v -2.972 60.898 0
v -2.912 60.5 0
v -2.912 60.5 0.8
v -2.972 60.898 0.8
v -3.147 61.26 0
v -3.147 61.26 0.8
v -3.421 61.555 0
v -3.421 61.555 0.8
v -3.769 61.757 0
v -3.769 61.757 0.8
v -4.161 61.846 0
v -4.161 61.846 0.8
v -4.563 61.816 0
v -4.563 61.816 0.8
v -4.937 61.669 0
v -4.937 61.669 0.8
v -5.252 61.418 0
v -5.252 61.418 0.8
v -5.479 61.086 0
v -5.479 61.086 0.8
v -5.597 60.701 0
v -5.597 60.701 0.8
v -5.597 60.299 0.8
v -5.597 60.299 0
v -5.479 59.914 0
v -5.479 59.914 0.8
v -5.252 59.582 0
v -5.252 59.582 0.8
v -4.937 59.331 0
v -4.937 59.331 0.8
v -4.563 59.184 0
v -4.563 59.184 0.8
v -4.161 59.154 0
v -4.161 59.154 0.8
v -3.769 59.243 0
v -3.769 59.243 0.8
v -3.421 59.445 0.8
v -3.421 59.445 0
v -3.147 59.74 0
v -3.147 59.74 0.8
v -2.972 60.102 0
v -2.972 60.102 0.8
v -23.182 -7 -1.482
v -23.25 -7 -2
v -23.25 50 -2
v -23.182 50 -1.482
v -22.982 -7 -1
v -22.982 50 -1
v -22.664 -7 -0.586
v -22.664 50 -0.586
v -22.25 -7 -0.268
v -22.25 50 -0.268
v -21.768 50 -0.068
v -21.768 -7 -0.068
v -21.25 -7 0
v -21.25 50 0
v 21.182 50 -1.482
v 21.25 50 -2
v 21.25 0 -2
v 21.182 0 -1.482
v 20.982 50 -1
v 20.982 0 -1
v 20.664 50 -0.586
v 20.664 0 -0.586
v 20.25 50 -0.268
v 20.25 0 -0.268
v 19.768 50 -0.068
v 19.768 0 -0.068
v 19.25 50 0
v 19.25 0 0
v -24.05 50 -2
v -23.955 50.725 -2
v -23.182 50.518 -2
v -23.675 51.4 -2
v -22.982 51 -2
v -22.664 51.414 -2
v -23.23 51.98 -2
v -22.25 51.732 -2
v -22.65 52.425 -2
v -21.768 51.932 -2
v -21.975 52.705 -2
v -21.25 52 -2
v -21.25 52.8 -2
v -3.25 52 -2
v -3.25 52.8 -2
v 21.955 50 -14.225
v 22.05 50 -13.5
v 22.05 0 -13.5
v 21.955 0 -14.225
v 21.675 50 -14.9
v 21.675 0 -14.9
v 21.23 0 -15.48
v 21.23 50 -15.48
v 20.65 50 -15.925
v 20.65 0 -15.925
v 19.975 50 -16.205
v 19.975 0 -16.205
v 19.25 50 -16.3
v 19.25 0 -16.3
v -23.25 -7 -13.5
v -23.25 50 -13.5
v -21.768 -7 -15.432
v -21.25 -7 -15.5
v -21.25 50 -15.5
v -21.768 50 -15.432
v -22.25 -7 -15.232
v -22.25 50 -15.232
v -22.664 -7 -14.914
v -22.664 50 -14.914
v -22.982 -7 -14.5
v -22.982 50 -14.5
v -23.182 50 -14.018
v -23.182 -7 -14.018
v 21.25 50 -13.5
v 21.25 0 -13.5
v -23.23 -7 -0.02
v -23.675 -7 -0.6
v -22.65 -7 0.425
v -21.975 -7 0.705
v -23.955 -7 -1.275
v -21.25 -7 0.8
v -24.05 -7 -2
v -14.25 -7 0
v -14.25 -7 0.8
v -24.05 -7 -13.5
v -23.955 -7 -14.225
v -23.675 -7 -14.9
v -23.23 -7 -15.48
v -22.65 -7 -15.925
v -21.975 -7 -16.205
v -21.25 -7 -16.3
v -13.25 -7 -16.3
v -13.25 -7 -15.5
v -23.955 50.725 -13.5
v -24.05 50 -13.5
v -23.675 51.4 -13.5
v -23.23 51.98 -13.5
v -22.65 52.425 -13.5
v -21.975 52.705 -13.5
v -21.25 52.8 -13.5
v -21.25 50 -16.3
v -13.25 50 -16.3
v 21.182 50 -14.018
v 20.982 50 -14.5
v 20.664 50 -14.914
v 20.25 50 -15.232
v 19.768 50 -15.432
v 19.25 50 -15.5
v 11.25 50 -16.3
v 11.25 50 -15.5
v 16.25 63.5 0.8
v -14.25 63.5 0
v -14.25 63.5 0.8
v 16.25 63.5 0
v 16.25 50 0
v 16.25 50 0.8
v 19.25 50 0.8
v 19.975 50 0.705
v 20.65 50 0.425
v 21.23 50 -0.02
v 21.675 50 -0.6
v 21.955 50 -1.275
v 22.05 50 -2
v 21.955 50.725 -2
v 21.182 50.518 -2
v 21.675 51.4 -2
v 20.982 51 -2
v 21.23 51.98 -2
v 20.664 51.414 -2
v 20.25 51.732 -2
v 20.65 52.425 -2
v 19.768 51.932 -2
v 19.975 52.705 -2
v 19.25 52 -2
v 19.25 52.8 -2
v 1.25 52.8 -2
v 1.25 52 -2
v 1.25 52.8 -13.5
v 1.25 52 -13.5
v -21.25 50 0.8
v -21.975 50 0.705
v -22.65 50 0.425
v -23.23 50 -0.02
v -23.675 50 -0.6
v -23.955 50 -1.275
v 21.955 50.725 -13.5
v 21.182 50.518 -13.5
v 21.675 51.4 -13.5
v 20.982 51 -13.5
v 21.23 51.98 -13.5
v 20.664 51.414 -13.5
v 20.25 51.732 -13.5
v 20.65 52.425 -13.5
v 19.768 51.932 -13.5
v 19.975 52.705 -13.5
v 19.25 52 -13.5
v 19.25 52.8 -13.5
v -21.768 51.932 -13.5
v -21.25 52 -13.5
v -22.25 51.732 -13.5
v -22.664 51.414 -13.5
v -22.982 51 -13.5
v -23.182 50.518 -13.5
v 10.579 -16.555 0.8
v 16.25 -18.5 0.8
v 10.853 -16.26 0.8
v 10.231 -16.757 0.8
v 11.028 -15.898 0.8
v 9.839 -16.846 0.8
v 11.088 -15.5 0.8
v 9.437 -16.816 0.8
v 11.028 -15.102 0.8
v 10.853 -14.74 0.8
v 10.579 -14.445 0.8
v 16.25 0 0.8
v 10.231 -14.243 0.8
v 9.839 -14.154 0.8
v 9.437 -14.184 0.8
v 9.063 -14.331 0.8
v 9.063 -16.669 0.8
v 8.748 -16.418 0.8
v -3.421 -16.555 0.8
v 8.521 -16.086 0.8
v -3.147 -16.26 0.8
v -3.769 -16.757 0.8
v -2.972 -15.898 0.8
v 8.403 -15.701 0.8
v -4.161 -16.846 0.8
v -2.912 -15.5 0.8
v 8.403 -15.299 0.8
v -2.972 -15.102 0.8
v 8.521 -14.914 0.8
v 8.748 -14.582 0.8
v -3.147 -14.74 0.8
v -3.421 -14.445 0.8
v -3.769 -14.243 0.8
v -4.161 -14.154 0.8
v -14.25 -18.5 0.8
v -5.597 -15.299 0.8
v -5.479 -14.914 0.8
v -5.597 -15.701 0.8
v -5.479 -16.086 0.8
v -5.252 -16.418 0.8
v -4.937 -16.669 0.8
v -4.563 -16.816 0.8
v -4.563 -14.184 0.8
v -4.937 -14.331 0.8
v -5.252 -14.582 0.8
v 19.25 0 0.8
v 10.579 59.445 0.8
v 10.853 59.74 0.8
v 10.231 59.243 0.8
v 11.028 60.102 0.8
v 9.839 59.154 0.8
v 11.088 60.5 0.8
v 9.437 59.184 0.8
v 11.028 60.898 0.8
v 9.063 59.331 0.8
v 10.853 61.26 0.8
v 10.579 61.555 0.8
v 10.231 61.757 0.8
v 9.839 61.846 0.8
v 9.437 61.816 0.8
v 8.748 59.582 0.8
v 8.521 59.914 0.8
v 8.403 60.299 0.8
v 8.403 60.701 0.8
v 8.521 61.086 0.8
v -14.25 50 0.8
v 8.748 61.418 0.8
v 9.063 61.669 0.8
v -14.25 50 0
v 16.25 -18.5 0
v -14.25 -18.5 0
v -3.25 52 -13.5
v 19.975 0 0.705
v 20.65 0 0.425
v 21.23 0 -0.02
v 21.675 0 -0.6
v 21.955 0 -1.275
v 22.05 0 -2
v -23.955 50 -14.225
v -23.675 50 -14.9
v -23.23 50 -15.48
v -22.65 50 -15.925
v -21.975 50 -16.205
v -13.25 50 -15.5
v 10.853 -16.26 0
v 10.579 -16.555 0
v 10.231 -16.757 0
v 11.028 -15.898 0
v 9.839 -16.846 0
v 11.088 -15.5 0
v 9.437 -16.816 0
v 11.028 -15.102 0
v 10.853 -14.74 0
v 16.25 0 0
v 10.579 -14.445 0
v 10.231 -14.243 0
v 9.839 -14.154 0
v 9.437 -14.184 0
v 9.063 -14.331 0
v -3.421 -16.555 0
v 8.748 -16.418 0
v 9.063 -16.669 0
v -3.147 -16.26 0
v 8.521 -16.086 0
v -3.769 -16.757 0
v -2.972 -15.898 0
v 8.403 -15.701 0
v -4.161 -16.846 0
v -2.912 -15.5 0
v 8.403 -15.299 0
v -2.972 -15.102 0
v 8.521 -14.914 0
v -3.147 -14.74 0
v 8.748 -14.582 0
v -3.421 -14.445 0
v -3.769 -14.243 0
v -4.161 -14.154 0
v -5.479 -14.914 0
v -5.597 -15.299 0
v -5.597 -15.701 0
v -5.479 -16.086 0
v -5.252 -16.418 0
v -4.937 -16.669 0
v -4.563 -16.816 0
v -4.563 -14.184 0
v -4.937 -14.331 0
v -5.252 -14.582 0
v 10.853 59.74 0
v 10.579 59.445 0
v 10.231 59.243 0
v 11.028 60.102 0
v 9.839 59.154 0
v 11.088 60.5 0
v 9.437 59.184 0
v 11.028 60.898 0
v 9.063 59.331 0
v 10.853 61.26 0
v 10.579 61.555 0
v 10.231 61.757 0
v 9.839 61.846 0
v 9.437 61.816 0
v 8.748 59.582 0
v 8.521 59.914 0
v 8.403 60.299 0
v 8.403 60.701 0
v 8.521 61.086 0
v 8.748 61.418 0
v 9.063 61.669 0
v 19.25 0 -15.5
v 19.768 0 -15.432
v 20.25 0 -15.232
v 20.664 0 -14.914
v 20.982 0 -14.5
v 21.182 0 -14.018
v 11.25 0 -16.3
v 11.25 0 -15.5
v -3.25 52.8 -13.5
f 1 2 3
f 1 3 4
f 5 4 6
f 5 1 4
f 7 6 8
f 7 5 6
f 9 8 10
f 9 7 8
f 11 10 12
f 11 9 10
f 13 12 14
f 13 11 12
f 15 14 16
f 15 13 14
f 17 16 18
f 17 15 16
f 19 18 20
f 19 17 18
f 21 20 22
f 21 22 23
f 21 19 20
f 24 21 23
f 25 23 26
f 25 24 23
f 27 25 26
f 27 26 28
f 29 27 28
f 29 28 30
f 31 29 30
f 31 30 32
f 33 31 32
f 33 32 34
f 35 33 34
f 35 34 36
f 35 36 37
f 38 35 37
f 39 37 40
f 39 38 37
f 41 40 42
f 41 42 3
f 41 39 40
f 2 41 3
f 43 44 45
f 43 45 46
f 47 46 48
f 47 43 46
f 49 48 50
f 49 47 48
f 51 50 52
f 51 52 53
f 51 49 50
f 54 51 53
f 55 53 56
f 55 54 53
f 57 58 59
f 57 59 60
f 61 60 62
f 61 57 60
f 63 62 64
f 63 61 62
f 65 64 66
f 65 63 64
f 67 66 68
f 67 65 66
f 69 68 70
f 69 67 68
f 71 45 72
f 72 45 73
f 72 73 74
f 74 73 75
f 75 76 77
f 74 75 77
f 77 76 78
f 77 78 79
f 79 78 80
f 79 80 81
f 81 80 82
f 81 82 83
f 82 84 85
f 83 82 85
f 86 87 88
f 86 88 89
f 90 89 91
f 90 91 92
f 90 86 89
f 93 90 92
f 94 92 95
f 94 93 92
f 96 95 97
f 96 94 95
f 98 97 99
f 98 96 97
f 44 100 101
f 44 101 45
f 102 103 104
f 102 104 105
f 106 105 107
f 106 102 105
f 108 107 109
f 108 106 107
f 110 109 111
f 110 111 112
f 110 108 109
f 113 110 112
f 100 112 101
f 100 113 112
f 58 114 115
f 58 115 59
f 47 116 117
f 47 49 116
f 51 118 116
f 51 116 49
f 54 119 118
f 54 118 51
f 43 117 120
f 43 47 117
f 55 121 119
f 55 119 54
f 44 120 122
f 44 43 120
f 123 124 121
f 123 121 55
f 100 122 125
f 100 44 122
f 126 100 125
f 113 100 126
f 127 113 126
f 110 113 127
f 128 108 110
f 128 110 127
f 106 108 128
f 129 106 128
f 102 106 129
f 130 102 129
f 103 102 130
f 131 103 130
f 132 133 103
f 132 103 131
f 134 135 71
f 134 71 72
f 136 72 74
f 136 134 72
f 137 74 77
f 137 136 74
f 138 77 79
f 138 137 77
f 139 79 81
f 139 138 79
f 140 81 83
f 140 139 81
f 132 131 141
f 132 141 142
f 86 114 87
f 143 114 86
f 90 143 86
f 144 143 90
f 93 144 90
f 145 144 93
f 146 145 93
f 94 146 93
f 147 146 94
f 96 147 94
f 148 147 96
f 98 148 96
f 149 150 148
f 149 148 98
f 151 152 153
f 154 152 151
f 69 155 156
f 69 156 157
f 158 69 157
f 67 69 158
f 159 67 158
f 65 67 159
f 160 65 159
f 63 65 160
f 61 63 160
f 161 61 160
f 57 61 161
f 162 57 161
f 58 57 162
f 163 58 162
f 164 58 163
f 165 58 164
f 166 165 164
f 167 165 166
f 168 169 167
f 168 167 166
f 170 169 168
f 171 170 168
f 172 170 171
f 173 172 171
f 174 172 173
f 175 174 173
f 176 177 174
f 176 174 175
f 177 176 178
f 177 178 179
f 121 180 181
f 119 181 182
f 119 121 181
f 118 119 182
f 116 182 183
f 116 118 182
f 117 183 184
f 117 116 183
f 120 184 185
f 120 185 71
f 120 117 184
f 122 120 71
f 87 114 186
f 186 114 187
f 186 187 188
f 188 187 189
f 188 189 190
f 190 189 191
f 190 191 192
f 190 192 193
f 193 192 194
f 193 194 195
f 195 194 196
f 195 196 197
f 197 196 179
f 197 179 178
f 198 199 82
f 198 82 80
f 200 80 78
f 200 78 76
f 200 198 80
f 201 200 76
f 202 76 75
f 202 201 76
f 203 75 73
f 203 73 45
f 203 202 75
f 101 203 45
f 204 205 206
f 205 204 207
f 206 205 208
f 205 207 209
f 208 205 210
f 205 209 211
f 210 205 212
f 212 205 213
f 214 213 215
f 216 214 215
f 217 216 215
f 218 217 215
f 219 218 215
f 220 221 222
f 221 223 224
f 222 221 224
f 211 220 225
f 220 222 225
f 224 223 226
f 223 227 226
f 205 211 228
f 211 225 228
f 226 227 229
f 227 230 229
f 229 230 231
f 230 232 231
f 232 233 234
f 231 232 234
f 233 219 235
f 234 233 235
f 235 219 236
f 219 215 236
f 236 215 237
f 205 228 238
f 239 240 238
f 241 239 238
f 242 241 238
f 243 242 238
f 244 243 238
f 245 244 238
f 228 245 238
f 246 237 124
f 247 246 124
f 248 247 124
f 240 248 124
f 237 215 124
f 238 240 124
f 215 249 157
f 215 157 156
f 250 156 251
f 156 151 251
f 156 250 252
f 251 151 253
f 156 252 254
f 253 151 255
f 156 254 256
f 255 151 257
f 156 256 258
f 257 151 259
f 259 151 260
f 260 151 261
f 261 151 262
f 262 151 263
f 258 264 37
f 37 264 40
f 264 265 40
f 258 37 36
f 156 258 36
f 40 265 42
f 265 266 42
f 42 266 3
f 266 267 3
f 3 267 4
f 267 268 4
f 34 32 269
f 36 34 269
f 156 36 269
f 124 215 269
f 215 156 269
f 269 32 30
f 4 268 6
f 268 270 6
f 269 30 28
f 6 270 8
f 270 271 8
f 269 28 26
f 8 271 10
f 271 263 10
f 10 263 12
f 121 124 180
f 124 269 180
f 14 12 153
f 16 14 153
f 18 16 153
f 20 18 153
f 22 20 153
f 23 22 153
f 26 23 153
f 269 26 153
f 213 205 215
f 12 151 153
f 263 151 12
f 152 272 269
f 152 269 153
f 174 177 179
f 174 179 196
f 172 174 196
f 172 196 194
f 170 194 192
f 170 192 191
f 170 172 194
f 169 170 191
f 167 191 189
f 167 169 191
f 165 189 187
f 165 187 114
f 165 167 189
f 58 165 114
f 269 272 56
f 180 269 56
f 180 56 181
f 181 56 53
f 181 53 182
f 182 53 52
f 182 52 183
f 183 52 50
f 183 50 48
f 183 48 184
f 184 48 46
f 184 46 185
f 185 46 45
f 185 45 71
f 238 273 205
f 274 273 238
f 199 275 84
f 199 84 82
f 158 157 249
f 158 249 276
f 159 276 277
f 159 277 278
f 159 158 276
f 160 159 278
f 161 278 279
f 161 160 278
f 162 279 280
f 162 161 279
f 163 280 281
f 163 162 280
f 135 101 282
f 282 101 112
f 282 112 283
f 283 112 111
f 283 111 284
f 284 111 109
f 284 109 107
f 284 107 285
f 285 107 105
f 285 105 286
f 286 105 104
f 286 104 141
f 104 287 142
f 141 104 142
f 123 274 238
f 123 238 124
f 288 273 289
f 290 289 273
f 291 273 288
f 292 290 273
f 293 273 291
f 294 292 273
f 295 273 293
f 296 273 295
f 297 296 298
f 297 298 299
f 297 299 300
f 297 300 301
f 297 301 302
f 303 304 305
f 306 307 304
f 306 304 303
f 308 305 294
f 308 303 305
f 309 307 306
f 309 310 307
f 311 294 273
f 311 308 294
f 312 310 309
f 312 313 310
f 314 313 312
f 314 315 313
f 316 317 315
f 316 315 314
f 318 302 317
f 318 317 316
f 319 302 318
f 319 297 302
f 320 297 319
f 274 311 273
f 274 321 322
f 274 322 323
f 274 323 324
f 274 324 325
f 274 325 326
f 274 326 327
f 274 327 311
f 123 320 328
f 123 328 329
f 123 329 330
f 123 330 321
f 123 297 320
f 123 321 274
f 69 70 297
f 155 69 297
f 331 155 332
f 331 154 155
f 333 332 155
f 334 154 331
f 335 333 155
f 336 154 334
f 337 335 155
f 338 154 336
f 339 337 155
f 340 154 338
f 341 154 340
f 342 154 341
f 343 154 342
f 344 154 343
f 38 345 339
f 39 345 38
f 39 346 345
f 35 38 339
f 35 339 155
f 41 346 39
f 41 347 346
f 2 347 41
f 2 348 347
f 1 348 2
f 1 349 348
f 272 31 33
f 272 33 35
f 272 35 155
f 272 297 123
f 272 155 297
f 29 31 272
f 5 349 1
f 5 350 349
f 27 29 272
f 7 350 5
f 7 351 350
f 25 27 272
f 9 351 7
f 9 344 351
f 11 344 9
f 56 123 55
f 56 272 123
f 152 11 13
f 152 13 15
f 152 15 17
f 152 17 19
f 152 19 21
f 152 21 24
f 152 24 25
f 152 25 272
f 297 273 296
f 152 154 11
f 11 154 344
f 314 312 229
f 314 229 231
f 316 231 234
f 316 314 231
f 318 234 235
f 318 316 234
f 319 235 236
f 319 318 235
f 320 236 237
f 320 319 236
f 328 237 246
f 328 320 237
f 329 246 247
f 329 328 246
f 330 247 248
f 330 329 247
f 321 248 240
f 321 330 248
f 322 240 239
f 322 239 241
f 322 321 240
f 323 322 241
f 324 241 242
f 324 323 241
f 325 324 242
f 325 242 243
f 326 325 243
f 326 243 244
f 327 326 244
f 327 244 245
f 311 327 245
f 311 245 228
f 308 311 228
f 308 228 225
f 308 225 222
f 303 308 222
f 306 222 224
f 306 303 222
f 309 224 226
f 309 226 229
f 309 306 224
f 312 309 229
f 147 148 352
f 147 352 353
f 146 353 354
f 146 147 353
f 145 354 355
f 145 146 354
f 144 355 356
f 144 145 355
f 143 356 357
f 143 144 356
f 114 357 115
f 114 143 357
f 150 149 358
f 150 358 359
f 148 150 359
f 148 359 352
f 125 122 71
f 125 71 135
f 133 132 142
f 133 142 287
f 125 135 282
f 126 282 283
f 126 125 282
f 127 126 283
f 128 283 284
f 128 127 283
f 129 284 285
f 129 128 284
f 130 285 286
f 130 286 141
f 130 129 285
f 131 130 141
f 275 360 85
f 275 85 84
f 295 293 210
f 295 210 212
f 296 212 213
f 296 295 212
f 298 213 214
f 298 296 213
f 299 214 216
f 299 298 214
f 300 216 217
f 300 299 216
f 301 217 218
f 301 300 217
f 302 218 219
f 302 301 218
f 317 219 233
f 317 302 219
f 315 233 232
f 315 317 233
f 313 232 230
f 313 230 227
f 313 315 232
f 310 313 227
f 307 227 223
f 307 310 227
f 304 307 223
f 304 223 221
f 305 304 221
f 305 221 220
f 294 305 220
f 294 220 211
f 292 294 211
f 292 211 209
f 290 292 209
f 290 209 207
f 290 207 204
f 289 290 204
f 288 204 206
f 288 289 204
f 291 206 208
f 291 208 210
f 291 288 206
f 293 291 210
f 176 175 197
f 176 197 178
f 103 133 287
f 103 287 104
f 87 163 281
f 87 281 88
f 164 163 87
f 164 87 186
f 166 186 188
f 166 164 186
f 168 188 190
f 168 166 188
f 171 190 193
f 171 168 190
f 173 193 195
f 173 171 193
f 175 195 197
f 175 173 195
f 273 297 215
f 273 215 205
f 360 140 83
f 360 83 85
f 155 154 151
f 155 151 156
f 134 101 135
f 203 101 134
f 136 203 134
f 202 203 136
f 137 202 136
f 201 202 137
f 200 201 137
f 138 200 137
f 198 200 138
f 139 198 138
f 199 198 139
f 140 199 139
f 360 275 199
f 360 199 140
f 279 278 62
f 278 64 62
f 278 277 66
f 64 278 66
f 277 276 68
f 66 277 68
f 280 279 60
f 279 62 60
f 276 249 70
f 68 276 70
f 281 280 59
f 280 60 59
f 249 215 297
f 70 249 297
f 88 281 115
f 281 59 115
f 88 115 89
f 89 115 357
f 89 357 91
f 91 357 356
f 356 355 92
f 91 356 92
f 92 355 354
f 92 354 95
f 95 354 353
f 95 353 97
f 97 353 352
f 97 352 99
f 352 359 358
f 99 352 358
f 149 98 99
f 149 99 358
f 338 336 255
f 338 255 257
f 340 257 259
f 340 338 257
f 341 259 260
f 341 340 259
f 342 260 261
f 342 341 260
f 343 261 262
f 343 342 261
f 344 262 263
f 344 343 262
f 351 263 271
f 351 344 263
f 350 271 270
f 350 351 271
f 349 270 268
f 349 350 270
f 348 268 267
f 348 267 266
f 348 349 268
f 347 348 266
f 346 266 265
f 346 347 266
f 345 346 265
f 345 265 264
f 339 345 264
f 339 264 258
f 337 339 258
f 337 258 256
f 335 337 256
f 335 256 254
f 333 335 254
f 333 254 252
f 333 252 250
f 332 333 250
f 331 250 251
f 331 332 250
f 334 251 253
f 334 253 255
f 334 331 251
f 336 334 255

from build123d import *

# Parameters (mm, degrees)
SKETCH1_R                      = 1.35
BASE_FLANGE1_DEPTH             = 0.8
EDGE_FLANGE1_STRIP_W           = 7.2
EDGE_FLANGE1_STRIP_H           = 0.8
EDGE_FLANGE1_STRIP_CUT_DEPTH   = 50
EDGE_FLANGE1_STRIP_2_W         = 7.2
EDGE_FLANGE1_STRIP_2_H         = 0.8
EDGE_FLANGE1_STRIP_CUT_2_DEPTH = 57
EDGE_FLANGE1_DEPTH             = 50
EDGE_FLANGE1_BEND_DEPTH        = 57
EDGE_FLANGE4_DEPTH             = 11.5
EDGE_FLANGE4_BEND_DEPTH        = 11.5
EDGE_FLANGE5_DEPTH             = 50
EDGE_FLANGE5_BEND_DEPTH        = 57


# Sheet-metal steps are written as plain solids
with BuildPart() as part:
    # Sketch1 → Base-Flange1 (new body)
    with BuildSketch(Plane.XY):
        Polygon((16.25, 0), (16.25, -18.5), (-14.25, -18.5), (-14.25, -7), (-23.25, -7), (-23.25, 50), (-14.25, 50), (-14.25, 63.5), (16.25, 63.5), (16.25, 50), (21.25, 50), (21.25, 0), align=None)
        with Locations((9.737756115, -15.5)):
            Circle(SKETCH1_R, mode=Mode.SUBTRACT)
        with Locations((-4.262243885, -15.5)):
            Circle(SKETCH1_R, mode=Mode.SUBTRACT)
        with Locations((9.737756115, 60.5)):
            Circle(SKETCH1_R, mode=Mode.SUBTRACT)
        with Locations((-4.262243885, 60.5)):
            Circle(SKETCH1_R, mode=Mode.SUBTRACT)
    extrude(amount=BASE_FLANGE1_DEPTH)

    # Edge-Flange1 strip (across the edge) → Edge-Flange1 strip cut (cut)
    with BuildSketch(Plane(origin=(21.25, 50, 0), x_dir=(-1, 0, 0), z_dir=(0, -1, 0))):
        with Locations((-1.6, -0.4)):
            Rectangle(EDGE_FLANGE1_STRIP_W, EDGE_FLANGE1_STRIP_H)
    extrude(amount=EDGE_FLANGE1_STRIP_CUT_DEPTH, mode=Mode.SUBTRACT)

    # Edge-Flange1 strip 2 (across the edge) → Edge-Flange1 strip cut 2 (cut)
    with BuildSketch(Plane(origin=(-23.25, -7, 0), x_dir=(1, 0, 0), z_dir=(0, 1, 0))):
        with Locations((-1.6, -0.4)):
            Rectangle(EDGE_FLANGE1_STRIP_2_W, EDGE_FLANGE1_STRIP_2_H)
    extrude(amount=EDGE_FLANGE1_STRIP_CUT_2_DEPTH, mode=Mode.SUBTRACT)

    # Edge-Flange1 section (across the edge) → Edge-Flange1 (add)
    with BuildSketch(Plane(origin=(21.25, 50, 0), x_dir=(-1, 0, 0), z_dir=(0, -1, 0))):
        with BuildLine():
            Line((-0.8, 2), (-0.8, 13.5))
            Line((-0.8, 13.5), (0, 13.5))
            Line((0, 13.5), (0, 2))
            ThreePointArc((0, 2), (0.585786438, 0.585786438), (2, 0))
            Line((2, 0), (2, -0.8))
            ThreePointArc((2, -0.8), (0.020101013, 0.020101013), (-0.8, 2))
        make_face()
    extrude(amount=EDGE_FLANGE1_DEPTH)

    # Edge-Flange1 section 2 (across the edge) → Edge-Flange1 bend (add)
    with BuildSketch(Plane(origin=(-23.25, -7, 0), x_dir=(1, 0, 0), z_dir=(0, 1, 0))):
        with BuildLine():
            Line((-0.8, 2), (-0.8, 13.5))
            Line((-0.8, 13.5), (0, 13.5))
            Line((0, 13.5), (0, 2))
            ThreePointArc((0, 2), (0.585786438, 0.585786438), (2, 0))
            Line((2, 0), (2, -0.8))
            ThreePointArc((2, -0.8), (0.020101013, 0.020101013), (-0.8, 2))
        make_face()
    extrude(amount=EDGE_FLANGE1_BEND_DEPTH)

    # Edge-Flange4 section (across the edge) → Edge-Flange4 (add)
    with BuildSketch(Plane(origin=(21.25, 52, -2), x_dir=(0, -1, 0), z_dir=(0, 0, -1))):
        with BuildLine():
            Line((-0.8, 2), (-0.8, 20))
            Line((-0.8, 20), (0, 20))
            Line((0, 20), (0, 2))
            ThreePointArc((0, 2), (0.585786438, 0.585786438), (2, 0))
            Line((2, 0), (2, -0.8))
            ThreePointArc((2, -0.8), (0.020101013, 0.020101013), (-0.8, 2))
        make_face()
    extrude(amount=EDGE_FLANGE4_DEPTH)

    # Edge-Flange4 section 2 (across the edge) → Edge-Flange4 bend (add)
    with BuildSketch(Plane(origin=(-23.25, 52, -13.5), x_dir=(0, -1, 0), z_dir=(0, 0, 1))):
        with BuildLine():
            Line((-0.8, 2), (-0.8, 20))
            Line((-0.8, 20), (0, 20))
            Line((0, 20), (0, 2))
            ThreePointArc((0, 2), (0.585786438, 0.585786438), (2, 0))
            Line((2, 0), (2, -0.8))
            ThreePointArc((2, -0.8), (0.020101013, 0.020101013), (-0.8, 2))
        make_face()
    extrude(amount=EDGE_FLANGE4_BEND_DEPTH)

    # Edge-Flange5 section (across the edge) → Edge-Flange5 (add)
    with BuildSketch(Plane(origin=(21.25, 50, -15.5), x_dir=(0, 0, 1), z_dir=(0, -1, 0))):
        with BuildLine():
            Line((-0.8, 2), (-0.8, 10))
            Line((-0.8, 10), (0, 10))
            Line((0, 10), (0, 2))
            ThreePointArc((0, 2), (0.585786438, 0.585786438), (2, 0))
            Line((2, 0), (2, -0.8))
            ThreePointArc((2, -0.8), (0.020101013, 0.020101013), (-0.8, 2))
        make_face()
    extrude(amount=EDGE_FLANGE5_DEPTH)

    # Edge-Flange5 section 2 (across the edge) → Edge-Flange5 bend (add)
    with BuildSketch(Plane(origin=(-23.25, -7, -15.5), x_dir=(0, 0, 1), z_dir=(0, 1, 0))):
        with BuildLine():
            Line((-0.8, 2), (-0.8, 10))
            Line((-0.8, 10), (0, 10))
            Line((0, 10), (0, 2))
            ThreePointArc((0, 2), (0.585786438, 0.585786438), (2, 0))
            Line((2, 0), (2, -0.8))
            ThreePointArc((2, -0.8), (0.020101013, 0.020101013), (-0.8, 2))
        make_face()
    extrude(amount=EDGE_FLANGE5_BEND_DEPTH)


solid = part.part
